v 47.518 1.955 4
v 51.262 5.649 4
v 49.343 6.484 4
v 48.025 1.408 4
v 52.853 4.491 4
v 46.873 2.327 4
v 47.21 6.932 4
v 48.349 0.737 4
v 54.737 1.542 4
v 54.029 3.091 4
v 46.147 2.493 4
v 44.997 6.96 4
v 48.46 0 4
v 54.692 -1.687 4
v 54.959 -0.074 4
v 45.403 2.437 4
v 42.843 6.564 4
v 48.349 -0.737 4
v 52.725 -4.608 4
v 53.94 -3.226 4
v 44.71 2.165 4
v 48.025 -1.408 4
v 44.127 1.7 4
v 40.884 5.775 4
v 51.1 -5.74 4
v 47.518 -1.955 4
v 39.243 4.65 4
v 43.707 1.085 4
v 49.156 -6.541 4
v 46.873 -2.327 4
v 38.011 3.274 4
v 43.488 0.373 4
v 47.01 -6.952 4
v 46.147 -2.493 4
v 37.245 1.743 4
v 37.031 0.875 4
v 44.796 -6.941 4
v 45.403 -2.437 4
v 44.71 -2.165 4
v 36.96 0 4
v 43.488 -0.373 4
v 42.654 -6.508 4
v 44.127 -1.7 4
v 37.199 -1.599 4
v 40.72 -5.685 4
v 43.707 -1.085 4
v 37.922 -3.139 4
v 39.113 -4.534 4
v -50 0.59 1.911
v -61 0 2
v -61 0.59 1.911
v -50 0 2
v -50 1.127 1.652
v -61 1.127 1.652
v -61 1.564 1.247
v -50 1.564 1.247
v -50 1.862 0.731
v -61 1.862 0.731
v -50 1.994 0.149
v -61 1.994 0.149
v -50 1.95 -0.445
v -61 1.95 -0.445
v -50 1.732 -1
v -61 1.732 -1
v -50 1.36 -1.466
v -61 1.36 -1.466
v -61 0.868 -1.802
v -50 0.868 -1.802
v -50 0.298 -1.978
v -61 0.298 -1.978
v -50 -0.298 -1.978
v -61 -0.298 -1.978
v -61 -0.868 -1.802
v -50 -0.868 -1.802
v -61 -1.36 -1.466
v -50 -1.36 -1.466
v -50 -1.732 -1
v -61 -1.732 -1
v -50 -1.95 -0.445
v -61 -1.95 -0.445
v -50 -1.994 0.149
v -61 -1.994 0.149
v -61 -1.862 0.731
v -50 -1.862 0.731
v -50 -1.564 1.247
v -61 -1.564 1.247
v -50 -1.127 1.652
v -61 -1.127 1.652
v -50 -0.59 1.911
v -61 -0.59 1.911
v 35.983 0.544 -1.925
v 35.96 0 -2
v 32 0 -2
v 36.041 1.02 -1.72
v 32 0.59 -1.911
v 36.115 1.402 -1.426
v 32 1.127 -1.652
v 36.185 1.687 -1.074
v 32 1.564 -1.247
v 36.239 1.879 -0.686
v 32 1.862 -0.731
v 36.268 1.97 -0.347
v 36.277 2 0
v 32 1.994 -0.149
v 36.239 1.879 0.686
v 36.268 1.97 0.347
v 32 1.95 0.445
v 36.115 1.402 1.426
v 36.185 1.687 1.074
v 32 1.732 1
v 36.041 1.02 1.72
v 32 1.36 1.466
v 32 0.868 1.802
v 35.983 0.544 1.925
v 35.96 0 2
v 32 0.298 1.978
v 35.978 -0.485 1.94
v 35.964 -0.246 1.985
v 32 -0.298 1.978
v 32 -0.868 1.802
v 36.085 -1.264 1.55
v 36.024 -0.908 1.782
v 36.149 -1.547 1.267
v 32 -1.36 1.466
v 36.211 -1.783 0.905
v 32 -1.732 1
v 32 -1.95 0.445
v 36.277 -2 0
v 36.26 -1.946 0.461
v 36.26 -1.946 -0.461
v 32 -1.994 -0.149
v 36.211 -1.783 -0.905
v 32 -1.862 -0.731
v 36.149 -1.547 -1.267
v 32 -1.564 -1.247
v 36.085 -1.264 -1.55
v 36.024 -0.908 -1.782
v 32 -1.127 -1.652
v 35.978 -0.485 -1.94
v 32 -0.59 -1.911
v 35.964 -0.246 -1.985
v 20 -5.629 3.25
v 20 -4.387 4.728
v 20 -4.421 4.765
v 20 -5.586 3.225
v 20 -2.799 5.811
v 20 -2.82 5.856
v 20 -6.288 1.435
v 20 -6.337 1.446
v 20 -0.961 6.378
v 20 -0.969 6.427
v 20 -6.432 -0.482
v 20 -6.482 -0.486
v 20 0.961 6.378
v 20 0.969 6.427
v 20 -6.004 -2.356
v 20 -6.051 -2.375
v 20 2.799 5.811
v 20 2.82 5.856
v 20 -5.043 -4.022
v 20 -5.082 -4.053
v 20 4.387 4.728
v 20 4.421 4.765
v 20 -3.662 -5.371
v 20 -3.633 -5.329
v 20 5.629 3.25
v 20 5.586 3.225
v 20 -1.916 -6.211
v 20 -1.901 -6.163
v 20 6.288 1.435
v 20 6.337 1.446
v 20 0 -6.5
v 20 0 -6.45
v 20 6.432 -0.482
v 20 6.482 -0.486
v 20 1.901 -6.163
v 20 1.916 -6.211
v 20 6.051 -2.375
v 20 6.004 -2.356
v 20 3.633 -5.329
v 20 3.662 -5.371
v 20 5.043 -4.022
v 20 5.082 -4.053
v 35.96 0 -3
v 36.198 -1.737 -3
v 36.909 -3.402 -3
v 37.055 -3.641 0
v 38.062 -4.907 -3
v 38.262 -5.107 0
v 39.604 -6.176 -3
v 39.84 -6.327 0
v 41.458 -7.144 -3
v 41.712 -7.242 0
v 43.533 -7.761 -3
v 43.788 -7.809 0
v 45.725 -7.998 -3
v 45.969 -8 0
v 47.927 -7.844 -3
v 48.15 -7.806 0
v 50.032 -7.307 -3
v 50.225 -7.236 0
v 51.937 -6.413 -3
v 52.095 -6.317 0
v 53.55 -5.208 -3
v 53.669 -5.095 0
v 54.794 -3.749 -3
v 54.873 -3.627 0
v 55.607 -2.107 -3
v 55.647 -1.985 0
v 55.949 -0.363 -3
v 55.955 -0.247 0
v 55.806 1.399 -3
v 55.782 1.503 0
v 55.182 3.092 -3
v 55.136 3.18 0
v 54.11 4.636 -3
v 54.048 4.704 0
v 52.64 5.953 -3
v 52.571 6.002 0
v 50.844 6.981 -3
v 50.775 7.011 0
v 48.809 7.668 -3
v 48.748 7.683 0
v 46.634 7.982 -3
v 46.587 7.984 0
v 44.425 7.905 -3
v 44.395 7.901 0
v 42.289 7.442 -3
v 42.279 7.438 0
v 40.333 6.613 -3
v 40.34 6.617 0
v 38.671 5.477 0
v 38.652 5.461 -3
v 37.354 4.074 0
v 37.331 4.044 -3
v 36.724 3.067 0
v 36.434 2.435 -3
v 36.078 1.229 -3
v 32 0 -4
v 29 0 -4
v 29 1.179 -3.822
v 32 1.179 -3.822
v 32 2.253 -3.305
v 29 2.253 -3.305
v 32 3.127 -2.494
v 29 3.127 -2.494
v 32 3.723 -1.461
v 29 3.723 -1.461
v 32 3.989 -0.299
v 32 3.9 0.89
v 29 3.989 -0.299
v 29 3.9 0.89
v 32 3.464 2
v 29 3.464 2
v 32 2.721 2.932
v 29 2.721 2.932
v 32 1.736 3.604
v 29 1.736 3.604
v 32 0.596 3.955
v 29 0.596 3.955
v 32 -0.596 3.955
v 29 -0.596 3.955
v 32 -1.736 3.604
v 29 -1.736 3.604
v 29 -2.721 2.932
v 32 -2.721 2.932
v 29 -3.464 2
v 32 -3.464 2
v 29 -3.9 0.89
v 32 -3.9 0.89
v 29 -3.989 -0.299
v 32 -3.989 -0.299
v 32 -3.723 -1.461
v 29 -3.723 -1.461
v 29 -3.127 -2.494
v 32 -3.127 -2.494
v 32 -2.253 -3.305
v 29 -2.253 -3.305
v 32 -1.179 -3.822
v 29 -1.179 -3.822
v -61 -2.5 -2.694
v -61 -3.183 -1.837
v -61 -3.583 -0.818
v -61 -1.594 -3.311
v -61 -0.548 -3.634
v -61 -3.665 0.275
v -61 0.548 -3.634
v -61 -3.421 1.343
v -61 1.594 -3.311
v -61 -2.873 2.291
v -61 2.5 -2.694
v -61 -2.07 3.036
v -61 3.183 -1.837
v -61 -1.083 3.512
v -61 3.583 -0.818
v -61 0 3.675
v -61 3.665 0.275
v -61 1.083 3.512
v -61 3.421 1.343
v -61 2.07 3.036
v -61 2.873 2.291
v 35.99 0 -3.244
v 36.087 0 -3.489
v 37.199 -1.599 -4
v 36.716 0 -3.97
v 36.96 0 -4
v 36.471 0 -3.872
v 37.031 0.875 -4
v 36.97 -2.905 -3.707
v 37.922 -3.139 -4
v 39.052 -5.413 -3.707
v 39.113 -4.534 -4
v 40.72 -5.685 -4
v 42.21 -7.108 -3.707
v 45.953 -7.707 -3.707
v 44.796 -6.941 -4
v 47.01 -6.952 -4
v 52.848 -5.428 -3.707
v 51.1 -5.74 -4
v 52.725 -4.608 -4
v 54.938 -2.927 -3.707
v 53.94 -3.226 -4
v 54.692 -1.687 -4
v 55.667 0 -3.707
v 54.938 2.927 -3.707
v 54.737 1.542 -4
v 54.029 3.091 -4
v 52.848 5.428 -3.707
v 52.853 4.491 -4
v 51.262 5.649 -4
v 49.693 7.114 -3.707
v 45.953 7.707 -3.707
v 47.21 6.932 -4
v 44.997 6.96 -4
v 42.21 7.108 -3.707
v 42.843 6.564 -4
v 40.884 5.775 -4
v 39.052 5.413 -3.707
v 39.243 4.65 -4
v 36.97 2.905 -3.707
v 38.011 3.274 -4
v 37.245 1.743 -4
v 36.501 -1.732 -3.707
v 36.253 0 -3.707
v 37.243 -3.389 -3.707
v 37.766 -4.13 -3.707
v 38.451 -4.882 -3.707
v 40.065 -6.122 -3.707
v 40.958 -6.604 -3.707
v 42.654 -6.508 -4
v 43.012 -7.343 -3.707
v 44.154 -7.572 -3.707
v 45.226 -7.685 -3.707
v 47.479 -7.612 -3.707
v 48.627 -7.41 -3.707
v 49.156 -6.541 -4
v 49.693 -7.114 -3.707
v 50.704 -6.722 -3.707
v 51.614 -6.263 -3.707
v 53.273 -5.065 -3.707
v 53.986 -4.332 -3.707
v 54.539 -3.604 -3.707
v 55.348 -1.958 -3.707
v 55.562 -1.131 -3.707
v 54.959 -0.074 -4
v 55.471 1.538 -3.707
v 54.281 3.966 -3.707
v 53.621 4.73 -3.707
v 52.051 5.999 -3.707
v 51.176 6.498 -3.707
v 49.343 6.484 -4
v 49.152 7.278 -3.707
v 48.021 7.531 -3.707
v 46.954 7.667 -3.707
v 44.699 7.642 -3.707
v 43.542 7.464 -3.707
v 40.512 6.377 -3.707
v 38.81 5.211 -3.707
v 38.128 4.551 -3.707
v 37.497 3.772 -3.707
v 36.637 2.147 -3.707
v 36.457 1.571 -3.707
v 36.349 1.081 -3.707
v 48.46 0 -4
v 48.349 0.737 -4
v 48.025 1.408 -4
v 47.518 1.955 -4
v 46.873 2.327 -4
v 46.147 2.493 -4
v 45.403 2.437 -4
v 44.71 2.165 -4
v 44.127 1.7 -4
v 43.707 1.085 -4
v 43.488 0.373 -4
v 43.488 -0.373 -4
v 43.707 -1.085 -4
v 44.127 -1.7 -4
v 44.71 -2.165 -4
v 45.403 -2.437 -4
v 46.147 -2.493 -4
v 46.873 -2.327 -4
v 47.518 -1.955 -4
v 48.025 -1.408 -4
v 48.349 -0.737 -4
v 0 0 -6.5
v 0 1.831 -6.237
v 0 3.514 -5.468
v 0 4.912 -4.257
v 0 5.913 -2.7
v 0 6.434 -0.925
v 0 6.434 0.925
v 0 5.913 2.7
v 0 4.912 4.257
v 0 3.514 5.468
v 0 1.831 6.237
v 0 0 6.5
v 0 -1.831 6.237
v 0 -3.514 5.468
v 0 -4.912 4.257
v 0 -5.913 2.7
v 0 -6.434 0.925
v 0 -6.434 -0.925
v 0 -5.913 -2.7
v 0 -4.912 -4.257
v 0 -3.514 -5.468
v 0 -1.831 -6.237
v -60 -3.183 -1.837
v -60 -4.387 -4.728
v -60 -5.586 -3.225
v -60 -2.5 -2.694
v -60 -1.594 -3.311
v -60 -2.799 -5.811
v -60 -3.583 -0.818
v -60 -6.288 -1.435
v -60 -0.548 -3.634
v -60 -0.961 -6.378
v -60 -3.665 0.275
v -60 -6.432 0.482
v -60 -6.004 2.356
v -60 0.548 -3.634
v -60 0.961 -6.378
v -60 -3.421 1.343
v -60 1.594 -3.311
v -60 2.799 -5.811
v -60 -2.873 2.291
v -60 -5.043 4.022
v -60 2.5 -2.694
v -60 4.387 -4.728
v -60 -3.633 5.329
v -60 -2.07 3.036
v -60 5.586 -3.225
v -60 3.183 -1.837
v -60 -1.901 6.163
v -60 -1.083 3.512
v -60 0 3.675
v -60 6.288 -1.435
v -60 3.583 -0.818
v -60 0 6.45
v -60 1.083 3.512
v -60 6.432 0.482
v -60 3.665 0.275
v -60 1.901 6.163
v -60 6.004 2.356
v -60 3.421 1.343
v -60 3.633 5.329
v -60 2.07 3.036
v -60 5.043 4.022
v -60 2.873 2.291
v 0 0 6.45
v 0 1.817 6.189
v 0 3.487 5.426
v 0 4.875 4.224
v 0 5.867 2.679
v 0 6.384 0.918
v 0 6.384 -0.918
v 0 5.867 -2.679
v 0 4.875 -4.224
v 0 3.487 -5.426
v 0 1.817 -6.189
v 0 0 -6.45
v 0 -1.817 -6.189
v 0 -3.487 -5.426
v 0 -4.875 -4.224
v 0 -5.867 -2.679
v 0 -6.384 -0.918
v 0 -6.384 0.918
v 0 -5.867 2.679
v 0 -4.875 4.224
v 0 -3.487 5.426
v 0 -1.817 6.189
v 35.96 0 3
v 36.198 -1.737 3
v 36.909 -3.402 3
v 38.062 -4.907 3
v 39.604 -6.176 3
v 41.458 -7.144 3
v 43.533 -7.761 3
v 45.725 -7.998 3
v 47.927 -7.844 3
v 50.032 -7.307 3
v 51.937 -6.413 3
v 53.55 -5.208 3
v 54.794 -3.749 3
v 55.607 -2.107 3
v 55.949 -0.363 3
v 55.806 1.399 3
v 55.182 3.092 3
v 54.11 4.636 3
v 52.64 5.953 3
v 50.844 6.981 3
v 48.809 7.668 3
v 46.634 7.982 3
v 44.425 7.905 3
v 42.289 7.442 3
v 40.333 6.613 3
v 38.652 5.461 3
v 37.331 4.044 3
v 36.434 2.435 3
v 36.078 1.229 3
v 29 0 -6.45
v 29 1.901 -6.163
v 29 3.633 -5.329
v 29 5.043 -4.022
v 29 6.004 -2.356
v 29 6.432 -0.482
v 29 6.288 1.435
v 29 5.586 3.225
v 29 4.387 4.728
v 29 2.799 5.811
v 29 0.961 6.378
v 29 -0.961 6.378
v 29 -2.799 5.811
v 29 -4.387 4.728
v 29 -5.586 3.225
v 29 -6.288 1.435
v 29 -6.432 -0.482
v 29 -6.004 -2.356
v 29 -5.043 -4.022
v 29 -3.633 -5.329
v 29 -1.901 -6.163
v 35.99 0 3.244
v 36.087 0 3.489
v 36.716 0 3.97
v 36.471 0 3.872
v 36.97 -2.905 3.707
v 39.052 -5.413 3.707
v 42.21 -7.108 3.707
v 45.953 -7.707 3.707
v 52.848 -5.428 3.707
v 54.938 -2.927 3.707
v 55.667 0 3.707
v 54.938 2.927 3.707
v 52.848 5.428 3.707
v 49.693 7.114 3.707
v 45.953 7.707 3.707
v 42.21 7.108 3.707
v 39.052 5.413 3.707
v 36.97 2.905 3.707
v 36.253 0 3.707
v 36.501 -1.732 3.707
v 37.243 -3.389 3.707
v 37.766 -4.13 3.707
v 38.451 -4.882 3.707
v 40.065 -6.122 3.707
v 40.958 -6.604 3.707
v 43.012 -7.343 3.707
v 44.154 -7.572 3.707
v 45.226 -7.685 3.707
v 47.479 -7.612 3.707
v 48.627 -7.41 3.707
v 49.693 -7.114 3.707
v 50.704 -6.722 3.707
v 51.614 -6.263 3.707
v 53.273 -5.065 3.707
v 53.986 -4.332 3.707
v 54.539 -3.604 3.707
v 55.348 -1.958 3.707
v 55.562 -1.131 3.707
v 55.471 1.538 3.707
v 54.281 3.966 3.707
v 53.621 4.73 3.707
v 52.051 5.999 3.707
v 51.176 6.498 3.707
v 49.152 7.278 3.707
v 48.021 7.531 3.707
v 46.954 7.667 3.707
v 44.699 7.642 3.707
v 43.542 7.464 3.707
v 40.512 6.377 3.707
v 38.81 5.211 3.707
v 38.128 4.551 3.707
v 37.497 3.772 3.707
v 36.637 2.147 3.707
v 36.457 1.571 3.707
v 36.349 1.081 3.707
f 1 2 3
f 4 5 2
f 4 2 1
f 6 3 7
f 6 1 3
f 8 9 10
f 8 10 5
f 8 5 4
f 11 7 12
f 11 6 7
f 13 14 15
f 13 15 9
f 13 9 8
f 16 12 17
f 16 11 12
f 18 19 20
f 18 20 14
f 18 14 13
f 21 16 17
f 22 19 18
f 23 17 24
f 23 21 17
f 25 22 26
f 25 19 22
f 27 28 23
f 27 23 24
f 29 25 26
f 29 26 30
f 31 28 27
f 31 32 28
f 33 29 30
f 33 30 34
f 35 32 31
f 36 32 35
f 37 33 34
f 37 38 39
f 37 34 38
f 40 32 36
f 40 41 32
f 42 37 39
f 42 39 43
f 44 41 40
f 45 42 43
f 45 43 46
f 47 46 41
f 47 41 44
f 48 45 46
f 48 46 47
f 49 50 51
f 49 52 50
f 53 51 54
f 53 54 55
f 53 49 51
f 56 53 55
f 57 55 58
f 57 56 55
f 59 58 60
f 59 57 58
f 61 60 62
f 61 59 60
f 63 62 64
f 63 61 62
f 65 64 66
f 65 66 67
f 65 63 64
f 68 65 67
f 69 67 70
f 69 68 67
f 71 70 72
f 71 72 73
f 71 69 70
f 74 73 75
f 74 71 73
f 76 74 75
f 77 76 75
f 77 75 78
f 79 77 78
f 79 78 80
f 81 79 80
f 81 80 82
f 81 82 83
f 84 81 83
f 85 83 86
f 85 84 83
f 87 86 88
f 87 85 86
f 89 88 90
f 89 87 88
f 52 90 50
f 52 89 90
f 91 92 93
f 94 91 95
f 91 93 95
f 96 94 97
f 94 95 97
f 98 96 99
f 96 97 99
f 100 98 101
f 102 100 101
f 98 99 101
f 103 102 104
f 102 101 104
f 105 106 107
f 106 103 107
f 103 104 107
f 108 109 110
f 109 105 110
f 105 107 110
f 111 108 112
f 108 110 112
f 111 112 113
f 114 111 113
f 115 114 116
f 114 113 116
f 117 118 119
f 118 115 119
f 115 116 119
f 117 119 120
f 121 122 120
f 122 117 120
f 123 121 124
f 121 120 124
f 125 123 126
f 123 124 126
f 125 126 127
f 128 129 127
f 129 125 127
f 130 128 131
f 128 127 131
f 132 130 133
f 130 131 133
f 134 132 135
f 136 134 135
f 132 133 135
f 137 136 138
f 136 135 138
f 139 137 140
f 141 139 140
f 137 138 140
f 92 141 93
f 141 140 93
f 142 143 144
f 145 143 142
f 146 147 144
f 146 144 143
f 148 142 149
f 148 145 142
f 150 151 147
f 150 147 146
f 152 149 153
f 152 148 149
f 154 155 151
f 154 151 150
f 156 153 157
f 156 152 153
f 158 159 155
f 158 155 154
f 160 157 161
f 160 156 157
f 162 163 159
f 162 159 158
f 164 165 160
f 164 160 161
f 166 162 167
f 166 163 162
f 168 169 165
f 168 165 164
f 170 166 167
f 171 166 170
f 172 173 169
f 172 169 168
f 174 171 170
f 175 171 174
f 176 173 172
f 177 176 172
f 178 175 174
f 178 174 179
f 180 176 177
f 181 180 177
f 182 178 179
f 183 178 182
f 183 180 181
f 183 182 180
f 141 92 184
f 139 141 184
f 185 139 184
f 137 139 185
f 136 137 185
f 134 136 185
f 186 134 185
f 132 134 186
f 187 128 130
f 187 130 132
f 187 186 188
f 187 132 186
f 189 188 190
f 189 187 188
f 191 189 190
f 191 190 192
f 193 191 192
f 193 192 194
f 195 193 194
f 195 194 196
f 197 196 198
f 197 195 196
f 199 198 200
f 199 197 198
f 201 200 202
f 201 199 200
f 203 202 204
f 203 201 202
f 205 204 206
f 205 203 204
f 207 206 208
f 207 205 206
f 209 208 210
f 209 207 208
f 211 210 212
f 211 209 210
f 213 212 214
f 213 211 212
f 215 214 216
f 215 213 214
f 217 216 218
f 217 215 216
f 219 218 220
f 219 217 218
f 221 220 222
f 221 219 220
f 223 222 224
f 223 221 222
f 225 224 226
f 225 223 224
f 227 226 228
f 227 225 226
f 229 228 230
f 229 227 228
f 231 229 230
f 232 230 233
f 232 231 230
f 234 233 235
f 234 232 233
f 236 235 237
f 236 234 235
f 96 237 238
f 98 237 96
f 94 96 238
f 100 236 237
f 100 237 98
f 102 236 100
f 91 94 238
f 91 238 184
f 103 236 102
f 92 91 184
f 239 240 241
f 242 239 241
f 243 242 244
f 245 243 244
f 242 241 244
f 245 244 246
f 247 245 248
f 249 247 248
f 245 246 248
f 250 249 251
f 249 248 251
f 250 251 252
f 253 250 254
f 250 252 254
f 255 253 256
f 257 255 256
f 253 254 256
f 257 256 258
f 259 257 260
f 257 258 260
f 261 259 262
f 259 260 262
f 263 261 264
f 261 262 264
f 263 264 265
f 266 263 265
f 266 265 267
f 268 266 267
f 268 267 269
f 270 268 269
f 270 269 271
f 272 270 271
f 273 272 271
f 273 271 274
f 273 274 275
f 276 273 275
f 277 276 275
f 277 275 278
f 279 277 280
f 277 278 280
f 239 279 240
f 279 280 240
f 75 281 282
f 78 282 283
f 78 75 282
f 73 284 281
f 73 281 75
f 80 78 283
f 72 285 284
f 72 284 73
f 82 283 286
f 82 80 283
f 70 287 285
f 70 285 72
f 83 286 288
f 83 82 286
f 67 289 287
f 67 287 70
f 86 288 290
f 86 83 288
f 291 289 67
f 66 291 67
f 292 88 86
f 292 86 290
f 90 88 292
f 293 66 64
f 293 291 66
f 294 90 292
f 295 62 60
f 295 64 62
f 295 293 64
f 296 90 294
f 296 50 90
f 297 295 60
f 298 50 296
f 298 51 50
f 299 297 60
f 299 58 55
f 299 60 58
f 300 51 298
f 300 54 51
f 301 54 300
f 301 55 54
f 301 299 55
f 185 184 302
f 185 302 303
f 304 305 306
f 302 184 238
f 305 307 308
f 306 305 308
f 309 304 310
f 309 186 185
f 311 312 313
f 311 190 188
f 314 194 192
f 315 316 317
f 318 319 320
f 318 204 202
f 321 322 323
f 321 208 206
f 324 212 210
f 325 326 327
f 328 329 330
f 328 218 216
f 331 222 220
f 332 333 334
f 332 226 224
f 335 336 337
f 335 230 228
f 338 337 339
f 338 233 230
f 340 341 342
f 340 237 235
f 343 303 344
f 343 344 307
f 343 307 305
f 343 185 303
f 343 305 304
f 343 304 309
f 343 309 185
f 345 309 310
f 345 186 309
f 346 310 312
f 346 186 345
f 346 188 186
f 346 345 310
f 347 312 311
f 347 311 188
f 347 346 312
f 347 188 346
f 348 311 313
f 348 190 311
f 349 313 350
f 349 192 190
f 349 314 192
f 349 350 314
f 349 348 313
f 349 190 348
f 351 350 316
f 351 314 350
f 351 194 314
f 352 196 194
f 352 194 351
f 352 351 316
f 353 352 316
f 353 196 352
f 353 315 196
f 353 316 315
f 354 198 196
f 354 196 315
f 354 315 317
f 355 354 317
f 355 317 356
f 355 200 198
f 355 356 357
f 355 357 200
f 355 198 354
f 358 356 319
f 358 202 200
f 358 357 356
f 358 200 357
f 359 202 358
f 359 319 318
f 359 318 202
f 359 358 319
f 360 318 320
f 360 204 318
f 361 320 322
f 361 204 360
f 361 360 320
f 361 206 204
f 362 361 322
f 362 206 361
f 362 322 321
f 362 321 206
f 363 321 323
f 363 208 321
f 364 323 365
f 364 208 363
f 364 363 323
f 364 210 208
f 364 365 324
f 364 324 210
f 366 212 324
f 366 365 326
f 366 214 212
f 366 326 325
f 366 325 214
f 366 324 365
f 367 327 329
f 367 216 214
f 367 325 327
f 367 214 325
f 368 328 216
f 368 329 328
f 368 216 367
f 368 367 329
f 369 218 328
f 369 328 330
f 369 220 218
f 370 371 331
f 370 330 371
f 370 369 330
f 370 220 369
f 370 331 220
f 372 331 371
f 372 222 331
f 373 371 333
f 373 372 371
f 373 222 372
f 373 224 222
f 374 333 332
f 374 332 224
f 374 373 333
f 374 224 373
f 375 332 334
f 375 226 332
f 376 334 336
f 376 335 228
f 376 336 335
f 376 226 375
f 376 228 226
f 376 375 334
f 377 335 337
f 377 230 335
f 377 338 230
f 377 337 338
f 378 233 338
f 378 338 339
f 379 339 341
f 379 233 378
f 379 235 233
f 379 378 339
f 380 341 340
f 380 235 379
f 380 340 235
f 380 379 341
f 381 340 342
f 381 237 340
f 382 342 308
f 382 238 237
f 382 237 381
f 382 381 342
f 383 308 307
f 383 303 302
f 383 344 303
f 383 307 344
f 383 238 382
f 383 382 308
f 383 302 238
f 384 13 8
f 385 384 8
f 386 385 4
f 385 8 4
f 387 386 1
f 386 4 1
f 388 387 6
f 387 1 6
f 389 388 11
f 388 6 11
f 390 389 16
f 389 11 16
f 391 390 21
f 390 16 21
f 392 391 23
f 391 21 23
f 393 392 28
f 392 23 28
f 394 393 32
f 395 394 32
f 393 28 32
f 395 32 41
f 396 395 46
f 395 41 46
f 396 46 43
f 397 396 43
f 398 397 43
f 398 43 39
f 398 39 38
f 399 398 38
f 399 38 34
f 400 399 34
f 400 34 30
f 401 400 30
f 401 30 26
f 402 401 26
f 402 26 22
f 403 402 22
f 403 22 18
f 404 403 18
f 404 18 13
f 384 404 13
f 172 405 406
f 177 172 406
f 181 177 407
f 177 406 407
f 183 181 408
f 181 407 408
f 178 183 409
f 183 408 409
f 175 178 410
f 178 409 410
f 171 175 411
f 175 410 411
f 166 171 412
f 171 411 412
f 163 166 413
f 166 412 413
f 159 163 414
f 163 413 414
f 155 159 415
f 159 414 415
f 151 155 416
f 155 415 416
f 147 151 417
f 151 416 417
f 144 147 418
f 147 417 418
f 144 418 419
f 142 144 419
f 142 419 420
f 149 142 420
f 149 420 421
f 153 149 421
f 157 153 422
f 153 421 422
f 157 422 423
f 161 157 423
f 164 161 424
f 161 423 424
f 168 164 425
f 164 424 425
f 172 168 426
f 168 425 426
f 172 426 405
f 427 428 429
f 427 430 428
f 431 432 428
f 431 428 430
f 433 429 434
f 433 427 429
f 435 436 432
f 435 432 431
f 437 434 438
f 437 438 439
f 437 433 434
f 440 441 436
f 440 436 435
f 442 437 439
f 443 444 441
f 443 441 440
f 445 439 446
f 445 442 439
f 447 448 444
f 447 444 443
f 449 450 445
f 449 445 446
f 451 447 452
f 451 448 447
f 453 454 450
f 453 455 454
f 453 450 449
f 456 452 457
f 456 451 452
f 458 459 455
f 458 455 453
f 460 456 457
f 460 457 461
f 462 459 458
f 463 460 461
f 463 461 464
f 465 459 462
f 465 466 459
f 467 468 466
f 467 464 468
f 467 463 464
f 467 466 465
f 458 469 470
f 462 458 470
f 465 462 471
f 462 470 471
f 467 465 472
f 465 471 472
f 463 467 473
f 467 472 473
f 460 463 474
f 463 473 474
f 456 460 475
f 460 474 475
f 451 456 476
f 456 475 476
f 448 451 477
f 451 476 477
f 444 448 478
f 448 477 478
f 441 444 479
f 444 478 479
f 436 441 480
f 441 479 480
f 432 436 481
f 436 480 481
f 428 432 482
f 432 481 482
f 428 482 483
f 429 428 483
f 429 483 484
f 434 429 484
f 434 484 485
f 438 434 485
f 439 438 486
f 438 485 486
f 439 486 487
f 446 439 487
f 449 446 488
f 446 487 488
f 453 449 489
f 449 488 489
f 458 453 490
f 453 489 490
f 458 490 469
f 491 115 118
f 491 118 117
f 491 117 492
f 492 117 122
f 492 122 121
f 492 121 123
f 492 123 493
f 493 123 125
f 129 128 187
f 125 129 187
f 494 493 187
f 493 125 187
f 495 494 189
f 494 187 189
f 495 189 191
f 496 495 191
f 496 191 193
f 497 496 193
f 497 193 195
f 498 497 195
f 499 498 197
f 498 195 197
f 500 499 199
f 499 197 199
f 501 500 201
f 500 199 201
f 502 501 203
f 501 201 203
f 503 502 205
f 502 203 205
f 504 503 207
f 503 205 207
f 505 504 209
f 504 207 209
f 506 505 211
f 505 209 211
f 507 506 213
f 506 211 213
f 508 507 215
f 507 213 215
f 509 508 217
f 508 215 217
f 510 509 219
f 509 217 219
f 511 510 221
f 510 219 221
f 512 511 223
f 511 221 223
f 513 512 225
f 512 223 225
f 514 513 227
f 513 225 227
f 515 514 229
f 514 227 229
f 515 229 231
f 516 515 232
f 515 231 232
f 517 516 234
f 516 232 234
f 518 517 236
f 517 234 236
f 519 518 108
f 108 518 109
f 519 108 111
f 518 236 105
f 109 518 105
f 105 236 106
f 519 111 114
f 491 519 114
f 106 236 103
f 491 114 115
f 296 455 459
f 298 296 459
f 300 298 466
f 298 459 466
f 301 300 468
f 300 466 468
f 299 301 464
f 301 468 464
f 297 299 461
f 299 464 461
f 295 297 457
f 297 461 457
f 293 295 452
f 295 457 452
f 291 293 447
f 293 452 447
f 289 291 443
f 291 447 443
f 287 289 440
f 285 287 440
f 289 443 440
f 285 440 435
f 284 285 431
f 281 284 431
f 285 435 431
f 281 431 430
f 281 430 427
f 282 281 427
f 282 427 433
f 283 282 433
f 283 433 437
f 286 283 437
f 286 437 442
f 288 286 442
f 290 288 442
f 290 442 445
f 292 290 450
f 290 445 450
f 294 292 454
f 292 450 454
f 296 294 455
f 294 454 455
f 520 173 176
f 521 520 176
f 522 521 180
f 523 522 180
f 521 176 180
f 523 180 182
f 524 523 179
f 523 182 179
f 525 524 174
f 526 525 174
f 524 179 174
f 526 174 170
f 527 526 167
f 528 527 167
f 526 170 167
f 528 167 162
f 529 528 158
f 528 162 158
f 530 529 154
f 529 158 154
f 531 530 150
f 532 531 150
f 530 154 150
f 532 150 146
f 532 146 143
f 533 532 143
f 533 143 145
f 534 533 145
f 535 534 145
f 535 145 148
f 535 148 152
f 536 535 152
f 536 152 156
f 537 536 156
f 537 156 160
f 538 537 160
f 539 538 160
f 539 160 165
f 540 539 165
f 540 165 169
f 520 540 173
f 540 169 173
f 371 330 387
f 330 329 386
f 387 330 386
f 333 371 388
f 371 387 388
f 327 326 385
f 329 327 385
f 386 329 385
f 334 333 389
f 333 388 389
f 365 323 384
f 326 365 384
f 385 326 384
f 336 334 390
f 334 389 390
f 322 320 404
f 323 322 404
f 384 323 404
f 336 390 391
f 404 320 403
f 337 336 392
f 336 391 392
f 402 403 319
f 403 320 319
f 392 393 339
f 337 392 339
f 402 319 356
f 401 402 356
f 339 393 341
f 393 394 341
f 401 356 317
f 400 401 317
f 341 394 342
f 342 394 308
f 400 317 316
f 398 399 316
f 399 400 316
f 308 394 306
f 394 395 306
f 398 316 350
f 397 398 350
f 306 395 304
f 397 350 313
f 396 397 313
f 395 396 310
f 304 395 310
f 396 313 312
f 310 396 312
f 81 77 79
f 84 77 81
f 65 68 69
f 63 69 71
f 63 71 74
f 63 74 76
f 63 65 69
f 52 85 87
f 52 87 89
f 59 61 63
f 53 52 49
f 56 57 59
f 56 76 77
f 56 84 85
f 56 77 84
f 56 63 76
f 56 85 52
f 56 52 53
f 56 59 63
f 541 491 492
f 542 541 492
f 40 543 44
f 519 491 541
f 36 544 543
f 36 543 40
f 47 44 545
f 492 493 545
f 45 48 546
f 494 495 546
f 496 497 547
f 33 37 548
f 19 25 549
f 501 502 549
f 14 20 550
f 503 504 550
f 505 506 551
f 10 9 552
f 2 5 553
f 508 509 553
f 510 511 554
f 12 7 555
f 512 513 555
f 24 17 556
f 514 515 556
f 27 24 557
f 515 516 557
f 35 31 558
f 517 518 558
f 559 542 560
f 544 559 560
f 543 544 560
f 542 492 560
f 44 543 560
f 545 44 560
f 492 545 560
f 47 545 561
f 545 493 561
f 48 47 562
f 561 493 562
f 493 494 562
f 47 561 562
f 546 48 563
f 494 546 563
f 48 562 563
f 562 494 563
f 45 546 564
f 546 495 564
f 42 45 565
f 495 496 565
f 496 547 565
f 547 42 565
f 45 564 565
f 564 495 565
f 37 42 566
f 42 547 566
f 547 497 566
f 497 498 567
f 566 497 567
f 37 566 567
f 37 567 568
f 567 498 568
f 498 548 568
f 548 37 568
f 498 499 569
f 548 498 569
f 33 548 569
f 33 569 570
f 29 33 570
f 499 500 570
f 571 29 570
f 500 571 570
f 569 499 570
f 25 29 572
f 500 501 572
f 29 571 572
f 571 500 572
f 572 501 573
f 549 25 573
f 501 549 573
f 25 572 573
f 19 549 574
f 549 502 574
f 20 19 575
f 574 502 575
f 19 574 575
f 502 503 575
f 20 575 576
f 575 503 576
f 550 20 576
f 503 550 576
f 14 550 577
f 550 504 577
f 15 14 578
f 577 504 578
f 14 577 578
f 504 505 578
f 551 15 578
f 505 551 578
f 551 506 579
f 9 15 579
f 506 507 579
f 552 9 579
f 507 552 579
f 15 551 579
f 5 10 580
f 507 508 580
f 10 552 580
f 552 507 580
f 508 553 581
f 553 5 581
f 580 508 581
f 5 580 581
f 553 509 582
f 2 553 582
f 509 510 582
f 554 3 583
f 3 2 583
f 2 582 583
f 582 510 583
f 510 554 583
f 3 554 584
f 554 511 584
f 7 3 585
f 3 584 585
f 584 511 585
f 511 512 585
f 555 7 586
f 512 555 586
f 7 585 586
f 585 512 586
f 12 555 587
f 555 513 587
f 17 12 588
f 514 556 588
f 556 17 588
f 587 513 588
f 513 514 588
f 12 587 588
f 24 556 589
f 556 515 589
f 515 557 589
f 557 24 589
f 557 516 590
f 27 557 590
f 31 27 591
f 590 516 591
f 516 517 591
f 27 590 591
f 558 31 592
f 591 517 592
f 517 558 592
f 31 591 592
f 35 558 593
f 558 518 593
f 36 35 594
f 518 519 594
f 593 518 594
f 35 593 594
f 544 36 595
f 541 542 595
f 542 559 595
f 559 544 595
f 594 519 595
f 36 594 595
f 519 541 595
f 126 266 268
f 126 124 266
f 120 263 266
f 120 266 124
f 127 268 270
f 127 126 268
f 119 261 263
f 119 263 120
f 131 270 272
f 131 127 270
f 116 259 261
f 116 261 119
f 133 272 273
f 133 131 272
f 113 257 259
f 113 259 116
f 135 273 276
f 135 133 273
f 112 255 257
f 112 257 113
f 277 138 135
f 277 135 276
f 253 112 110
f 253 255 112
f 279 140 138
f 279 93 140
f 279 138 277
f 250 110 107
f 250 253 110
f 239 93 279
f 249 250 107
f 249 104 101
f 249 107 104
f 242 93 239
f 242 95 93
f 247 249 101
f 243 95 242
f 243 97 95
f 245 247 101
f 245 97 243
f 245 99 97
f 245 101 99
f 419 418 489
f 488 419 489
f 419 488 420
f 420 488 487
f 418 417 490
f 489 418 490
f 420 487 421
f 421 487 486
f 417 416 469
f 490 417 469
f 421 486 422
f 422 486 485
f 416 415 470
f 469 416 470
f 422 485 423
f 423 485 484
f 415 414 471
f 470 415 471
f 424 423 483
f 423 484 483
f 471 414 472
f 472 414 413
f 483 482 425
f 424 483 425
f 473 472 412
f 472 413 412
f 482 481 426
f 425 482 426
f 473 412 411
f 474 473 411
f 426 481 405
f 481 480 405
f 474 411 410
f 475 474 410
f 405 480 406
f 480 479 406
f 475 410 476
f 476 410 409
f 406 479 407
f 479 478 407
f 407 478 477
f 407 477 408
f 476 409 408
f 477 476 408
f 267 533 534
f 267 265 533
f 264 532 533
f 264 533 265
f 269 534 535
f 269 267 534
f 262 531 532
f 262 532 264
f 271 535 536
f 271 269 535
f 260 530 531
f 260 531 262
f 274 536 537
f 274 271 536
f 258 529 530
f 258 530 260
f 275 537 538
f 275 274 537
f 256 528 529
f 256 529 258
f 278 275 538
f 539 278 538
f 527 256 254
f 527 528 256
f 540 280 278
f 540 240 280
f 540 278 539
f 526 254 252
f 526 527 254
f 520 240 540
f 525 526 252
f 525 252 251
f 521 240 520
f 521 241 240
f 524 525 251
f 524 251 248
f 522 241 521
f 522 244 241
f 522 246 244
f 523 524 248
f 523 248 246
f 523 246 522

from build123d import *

# Parameters (mm, degrees)
SKETCH1_R                = 6.5
BOSS_EXTRUDE1_DEPTH      = 20
SKETCH2_R                = 6.45
BOSS_EXTRUDE2_DEPTH      = 9
SKETCH3_R                = 4
BOSS_EXTRUDE3_DEPTH      = 3
BOSS_EXTRUDE4_DEPTH      = 4
BOSS_EXTRUDE4_DEPTH_BACK = 4
SKETCH4_RX               = 10
SKETCH4_RY               = 8
FILLET2_R                = 1
SKETCH5_R                = 2
BOSS_EXTRUDE5_DEPTH      = 11.5
SKETCH8_R                = 2.5
CUT_EXTRUDE1_DEPTH       = 58.495545747
BOSS_EXTRUDE6_START      = 60
SKETCH9_R                = 6.45
BOSS_EXTRUDE6_DEPTH      = 60
SKETCH10_R               = 2
CUT_EXTRUDE2_DEPTH       = 10
BOSS_EXTRUDE7_START      = 1
SKETCH11_R               = 3.674860137
SKETCH11_R_2             = 2
BOSS_EXTRUDE7_DEPTH      = 1


with BuildPart() as part:
    # Sketch1 → Boss-Extrude1 (new body)
    with BuildSketch(Plane(origin=(0, 0, 0), x_dir=(0, 0, -1), z_dir=(1, 0, 0))):
        Circle(SKETCH1_R)
    extrude(amount=BOSS_EXTRUDE1_DEPTH)

    # Sketch2 → Boss-Extrude2 (add)
    with BuildSketch(Plane(origin=(20, 0, 0), x_dir=(0, 0, -1), z_dir=(1, 0, 0))):
        Circle(SKETCH2_R)
    extrude(amount=BOSS_EXTRUDE2_DEPTH)

    # Sketch3 → Boss-Extrude3 (add)
    with BuildSketch(Plane(origin=(29, 0, 0), x_dir=(0, 0, -1), z_dir=(1, 0, 0))):
        Circle(SKETCH3_R)
    extrude(amount=BOSS_EXTRUDE3_DEPTH)



with BuildPart() as body_2:
    # Sketch4 → Boss-Extrude4 (new, two sides: drawn at the far end of the back side and taken through both)
    with BuildSketch(Plane.XY.offset(-BOSS_EXTRUDE4_DEPTH_BACK)):
        with Locations(Location((45.959697712, 0), (0, 0, 180))):
            Ellipse(SKETCH4_RX, SKETCH4_RY)
    extrude(amount=BOSS_EXTRUDE4_DEPTH + BOSS_EXTRUDE4_DEPTH_BACK)

    # Fillet2
    fillet2_edges = [body_2.edges().sort_by_distance(p)[0] for p in [
        (55.959697589, 0.00125173, -4),
        (55.959697589, 0.00125173, 4),
    ]]
    fillet(fillet2_edges, radius=FILLET2_R)


with BuildPart() as part_1:
    add(part.part)

    add(body_2.part)  # Boss-Extrude5 merges body 2
    # Sketch5 → Boss-Extrude5 (add)
    with BuildSketch(Plane(origin=(32, 0, 0), x_dir=(0, 0, -1), z_dir=(1, 0, 0))):
        Circle(SKETCH5_R)
    extrude(amount=BOSS_EXTRUDE5_DEPTH)

    # Sketch8 → Cut-Extrude1 (cut, through all)
    with BuildSketch(Plane.XY.offset(4)):
        with Locations((45.959697644, 0)):
            Circle(SKETCH8_R)
    extrude(amount=-CUT_EXTRUDE1_DEPTH, mode=Mode.SUBTRACT)

    # Sketch9 → Boss-Extrude6 (add)
    with BuildSketch(Plane.ZY.offset(BOSS_EXTRUDE6_START)):
        Circle(SKETCH9_R)
    extrude(amount=-BOSS_EXTRUDE6_DEPTH)

    # Sketch10 → Cut-Extrude2 (cut)
    with BuildSketch(Plane.ZY.offset(60)):
        Circle(SKETCH10_R)
    extrude(amount=-CUT_EXTRUDE2_DEPTH, mode=Mode.SUBTRACT)

    # Sketch11 → Boss-Extrude7 (add)
    with BuildSketch(Plane.ZY.offset(60).offset(BOSS_EXTRUDE7_START)):
        Circle(SKETCH11_R)
        Circle(SKETCH11_R_2, mode=Mode.SUBTRACT)
    extrude(amount=-BOSS_EXTRUDE7_DEPTH)


solid = part_1.part
